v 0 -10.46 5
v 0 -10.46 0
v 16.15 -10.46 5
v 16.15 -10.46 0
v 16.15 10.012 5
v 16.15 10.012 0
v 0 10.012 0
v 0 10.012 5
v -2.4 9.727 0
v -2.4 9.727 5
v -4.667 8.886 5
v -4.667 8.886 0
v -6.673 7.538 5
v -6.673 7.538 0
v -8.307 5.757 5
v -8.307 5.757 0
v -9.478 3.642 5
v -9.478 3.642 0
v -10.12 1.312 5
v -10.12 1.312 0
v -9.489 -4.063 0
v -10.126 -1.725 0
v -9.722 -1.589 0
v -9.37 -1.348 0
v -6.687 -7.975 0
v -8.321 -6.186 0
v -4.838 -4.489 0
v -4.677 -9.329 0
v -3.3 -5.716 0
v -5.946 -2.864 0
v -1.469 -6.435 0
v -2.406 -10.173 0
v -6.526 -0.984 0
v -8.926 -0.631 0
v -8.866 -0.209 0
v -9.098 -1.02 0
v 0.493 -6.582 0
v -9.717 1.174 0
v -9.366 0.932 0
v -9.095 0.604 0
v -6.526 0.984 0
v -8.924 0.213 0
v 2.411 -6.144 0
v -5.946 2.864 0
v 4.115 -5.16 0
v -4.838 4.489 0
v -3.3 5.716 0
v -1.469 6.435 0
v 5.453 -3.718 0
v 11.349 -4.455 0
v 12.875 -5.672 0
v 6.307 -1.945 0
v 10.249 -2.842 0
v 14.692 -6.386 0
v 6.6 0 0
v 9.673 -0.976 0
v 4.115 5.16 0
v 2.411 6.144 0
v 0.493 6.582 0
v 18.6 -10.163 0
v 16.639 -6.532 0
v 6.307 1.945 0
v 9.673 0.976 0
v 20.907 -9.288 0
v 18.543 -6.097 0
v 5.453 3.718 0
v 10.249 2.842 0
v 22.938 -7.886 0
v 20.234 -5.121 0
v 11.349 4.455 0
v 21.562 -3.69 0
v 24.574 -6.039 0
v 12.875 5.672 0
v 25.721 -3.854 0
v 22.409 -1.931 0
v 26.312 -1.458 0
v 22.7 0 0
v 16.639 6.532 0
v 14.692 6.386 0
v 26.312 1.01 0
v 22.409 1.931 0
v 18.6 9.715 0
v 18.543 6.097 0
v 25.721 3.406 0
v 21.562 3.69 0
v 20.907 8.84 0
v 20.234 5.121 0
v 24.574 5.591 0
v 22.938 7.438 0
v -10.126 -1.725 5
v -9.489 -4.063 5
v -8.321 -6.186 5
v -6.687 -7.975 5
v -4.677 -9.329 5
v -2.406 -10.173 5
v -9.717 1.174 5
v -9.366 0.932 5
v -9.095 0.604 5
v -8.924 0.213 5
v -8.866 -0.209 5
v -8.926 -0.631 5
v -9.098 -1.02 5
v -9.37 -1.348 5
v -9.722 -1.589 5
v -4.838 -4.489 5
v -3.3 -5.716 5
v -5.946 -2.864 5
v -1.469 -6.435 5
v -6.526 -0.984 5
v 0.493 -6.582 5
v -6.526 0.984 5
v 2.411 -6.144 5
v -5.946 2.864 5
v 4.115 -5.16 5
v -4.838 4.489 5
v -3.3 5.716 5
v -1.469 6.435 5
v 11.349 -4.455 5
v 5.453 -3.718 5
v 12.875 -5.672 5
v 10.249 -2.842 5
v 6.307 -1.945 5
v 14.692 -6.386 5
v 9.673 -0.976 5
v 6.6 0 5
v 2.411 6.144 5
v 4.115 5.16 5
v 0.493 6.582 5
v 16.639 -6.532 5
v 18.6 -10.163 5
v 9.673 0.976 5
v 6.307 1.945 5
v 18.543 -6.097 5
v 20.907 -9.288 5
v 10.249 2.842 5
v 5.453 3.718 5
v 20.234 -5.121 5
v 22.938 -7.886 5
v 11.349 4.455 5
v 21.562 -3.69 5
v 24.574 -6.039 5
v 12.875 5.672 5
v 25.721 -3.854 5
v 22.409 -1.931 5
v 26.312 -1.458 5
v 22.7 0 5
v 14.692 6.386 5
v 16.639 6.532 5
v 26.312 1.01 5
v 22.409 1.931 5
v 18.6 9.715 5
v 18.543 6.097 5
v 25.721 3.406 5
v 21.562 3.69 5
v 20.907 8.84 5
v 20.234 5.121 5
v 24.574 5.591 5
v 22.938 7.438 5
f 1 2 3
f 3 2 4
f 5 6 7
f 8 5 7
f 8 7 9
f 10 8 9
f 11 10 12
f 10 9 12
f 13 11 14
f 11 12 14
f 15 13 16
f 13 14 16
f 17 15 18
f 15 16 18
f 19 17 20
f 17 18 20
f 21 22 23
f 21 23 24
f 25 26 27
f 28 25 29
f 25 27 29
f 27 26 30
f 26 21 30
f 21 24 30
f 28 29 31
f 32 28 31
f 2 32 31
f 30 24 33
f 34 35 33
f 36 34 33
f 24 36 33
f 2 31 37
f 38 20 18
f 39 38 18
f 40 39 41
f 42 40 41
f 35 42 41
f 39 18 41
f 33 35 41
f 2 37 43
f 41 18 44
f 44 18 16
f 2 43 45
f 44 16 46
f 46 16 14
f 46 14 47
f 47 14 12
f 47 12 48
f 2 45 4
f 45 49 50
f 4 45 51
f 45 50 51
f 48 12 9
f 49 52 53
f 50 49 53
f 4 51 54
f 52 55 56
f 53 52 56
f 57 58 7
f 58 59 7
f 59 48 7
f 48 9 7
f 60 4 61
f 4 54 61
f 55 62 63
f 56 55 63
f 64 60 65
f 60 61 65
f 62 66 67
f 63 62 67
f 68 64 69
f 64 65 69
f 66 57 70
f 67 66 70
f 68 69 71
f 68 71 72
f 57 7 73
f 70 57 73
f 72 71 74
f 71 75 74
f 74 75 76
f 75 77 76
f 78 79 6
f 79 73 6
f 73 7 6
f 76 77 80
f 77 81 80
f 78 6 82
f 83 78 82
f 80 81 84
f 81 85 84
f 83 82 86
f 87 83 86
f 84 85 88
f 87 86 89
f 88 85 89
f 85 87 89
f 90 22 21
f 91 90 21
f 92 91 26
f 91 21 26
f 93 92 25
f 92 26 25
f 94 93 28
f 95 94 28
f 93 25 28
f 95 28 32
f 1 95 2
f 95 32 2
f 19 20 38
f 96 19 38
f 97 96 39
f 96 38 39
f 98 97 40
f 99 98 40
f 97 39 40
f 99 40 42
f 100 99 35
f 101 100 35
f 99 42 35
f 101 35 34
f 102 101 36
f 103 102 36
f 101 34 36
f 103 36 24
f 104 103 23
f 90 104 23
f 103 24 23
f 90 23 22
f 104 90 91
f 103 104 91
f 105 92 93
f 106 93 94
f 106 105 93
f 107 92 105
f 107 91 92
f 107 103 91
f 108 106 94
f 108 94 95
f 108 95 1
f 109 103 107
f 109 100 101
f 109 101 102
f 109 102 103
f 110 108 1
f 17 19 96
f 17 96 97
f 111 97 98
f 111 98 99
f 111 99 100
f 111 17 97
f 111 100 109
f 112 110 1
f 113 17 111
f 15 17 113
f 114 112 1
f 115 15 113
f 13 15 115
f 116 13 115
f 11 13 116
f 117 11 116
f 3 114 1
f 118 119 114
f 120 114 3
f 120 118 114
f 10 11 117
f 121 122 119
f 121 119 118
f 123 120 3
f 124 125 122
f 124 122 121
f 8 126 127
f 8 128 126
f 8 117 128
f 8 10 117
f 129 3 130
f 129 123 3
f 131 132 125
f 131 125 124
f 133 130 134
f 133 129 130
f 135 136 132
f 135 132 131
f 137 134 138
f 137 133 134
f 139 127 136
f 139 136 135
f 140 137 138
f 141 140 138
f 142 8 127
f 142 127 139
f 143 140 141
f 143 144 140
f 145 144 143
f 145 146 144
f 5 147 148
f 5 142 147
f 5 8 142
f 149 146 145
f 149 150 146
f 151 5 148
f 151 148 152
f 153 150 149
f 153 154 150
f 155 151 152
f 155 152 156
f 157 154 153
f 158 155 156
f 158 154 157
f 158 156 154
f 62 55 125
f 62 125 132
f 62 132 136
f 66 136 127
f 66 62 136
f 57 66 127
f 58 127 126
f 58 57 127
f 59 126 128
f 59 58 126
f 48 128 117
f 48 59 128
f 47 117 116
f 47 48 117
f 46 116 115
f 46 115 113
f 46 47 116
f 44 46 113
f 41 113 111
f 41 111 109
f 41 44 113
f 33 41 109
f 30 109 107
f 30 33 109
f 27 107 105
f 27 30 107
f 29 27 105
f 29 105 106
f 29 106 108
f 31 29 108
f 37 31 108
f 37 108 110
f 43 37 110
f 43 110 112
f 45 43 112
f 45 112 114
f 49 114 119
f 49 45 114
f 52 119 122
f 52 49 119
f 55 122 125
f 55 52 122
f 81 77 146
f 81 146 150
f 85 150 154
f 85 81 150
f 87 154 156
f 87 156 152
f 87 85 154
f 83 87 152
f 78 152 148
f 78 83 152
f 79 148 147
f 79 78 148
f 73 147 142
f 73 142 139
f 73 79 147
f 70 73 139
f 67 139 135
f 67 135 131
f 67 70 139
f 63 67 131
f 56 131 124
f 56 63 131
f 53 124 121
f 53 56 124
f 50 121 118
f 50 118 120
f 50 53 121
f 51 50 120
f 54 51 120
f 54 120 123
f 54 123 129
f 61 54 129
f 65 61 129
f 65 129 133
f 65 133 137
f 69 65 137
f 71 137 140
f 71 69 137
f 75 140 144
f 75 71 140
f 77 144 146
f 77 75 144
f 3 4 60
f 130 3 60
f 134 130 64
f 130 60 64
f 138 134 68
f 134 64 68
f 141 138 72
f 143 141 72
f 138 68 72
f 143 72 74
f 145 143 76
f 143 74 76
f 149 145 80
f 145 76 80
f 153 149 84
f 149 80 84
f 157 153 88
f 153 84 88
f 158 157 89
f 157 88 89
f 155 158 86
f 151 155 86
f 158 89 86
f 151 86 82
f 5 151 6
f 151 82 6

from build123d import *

# Parameters (mm, degrees)
F0_R     = 6.6
F0_R_2   = 6.55
F1_DEPTH = 5


with BuildPart() as f1:
    # F0 (on Top) → F1 (new body)
    with BuildSketch(Plane.XY):
        with BuildLine():
            Line((16.15, 10.01215), (0, 10.01215))
            ThreePointArc((0, 10.01215), (-6.6731, 7.538008), (-10.120357, 1.311607))
            ThreePointArc((-10.120357, 1.311607), (-8.866222, -0.208711), (-10.125611, -1.724678))
            ThreePointArc((-10.125611, -1.724678), (-6.686523, -7.974556), (0, -10.460258))
            Line((0, -10.460258), (16.15, -10.460258))
            ThreePointArc((16.15, -10.460258), (26.386204, -0.224054), (16.15, 10.01215))
        make_face()
        Circle(F0_R, mode=Mode.SUBTRACT)
        with Locations((16.15, 0)):
            Circle(F0_R_2, mode=Mode.SUBTRACT)
    extrude(amount=F1_DEPTH)


solid = f1.part
